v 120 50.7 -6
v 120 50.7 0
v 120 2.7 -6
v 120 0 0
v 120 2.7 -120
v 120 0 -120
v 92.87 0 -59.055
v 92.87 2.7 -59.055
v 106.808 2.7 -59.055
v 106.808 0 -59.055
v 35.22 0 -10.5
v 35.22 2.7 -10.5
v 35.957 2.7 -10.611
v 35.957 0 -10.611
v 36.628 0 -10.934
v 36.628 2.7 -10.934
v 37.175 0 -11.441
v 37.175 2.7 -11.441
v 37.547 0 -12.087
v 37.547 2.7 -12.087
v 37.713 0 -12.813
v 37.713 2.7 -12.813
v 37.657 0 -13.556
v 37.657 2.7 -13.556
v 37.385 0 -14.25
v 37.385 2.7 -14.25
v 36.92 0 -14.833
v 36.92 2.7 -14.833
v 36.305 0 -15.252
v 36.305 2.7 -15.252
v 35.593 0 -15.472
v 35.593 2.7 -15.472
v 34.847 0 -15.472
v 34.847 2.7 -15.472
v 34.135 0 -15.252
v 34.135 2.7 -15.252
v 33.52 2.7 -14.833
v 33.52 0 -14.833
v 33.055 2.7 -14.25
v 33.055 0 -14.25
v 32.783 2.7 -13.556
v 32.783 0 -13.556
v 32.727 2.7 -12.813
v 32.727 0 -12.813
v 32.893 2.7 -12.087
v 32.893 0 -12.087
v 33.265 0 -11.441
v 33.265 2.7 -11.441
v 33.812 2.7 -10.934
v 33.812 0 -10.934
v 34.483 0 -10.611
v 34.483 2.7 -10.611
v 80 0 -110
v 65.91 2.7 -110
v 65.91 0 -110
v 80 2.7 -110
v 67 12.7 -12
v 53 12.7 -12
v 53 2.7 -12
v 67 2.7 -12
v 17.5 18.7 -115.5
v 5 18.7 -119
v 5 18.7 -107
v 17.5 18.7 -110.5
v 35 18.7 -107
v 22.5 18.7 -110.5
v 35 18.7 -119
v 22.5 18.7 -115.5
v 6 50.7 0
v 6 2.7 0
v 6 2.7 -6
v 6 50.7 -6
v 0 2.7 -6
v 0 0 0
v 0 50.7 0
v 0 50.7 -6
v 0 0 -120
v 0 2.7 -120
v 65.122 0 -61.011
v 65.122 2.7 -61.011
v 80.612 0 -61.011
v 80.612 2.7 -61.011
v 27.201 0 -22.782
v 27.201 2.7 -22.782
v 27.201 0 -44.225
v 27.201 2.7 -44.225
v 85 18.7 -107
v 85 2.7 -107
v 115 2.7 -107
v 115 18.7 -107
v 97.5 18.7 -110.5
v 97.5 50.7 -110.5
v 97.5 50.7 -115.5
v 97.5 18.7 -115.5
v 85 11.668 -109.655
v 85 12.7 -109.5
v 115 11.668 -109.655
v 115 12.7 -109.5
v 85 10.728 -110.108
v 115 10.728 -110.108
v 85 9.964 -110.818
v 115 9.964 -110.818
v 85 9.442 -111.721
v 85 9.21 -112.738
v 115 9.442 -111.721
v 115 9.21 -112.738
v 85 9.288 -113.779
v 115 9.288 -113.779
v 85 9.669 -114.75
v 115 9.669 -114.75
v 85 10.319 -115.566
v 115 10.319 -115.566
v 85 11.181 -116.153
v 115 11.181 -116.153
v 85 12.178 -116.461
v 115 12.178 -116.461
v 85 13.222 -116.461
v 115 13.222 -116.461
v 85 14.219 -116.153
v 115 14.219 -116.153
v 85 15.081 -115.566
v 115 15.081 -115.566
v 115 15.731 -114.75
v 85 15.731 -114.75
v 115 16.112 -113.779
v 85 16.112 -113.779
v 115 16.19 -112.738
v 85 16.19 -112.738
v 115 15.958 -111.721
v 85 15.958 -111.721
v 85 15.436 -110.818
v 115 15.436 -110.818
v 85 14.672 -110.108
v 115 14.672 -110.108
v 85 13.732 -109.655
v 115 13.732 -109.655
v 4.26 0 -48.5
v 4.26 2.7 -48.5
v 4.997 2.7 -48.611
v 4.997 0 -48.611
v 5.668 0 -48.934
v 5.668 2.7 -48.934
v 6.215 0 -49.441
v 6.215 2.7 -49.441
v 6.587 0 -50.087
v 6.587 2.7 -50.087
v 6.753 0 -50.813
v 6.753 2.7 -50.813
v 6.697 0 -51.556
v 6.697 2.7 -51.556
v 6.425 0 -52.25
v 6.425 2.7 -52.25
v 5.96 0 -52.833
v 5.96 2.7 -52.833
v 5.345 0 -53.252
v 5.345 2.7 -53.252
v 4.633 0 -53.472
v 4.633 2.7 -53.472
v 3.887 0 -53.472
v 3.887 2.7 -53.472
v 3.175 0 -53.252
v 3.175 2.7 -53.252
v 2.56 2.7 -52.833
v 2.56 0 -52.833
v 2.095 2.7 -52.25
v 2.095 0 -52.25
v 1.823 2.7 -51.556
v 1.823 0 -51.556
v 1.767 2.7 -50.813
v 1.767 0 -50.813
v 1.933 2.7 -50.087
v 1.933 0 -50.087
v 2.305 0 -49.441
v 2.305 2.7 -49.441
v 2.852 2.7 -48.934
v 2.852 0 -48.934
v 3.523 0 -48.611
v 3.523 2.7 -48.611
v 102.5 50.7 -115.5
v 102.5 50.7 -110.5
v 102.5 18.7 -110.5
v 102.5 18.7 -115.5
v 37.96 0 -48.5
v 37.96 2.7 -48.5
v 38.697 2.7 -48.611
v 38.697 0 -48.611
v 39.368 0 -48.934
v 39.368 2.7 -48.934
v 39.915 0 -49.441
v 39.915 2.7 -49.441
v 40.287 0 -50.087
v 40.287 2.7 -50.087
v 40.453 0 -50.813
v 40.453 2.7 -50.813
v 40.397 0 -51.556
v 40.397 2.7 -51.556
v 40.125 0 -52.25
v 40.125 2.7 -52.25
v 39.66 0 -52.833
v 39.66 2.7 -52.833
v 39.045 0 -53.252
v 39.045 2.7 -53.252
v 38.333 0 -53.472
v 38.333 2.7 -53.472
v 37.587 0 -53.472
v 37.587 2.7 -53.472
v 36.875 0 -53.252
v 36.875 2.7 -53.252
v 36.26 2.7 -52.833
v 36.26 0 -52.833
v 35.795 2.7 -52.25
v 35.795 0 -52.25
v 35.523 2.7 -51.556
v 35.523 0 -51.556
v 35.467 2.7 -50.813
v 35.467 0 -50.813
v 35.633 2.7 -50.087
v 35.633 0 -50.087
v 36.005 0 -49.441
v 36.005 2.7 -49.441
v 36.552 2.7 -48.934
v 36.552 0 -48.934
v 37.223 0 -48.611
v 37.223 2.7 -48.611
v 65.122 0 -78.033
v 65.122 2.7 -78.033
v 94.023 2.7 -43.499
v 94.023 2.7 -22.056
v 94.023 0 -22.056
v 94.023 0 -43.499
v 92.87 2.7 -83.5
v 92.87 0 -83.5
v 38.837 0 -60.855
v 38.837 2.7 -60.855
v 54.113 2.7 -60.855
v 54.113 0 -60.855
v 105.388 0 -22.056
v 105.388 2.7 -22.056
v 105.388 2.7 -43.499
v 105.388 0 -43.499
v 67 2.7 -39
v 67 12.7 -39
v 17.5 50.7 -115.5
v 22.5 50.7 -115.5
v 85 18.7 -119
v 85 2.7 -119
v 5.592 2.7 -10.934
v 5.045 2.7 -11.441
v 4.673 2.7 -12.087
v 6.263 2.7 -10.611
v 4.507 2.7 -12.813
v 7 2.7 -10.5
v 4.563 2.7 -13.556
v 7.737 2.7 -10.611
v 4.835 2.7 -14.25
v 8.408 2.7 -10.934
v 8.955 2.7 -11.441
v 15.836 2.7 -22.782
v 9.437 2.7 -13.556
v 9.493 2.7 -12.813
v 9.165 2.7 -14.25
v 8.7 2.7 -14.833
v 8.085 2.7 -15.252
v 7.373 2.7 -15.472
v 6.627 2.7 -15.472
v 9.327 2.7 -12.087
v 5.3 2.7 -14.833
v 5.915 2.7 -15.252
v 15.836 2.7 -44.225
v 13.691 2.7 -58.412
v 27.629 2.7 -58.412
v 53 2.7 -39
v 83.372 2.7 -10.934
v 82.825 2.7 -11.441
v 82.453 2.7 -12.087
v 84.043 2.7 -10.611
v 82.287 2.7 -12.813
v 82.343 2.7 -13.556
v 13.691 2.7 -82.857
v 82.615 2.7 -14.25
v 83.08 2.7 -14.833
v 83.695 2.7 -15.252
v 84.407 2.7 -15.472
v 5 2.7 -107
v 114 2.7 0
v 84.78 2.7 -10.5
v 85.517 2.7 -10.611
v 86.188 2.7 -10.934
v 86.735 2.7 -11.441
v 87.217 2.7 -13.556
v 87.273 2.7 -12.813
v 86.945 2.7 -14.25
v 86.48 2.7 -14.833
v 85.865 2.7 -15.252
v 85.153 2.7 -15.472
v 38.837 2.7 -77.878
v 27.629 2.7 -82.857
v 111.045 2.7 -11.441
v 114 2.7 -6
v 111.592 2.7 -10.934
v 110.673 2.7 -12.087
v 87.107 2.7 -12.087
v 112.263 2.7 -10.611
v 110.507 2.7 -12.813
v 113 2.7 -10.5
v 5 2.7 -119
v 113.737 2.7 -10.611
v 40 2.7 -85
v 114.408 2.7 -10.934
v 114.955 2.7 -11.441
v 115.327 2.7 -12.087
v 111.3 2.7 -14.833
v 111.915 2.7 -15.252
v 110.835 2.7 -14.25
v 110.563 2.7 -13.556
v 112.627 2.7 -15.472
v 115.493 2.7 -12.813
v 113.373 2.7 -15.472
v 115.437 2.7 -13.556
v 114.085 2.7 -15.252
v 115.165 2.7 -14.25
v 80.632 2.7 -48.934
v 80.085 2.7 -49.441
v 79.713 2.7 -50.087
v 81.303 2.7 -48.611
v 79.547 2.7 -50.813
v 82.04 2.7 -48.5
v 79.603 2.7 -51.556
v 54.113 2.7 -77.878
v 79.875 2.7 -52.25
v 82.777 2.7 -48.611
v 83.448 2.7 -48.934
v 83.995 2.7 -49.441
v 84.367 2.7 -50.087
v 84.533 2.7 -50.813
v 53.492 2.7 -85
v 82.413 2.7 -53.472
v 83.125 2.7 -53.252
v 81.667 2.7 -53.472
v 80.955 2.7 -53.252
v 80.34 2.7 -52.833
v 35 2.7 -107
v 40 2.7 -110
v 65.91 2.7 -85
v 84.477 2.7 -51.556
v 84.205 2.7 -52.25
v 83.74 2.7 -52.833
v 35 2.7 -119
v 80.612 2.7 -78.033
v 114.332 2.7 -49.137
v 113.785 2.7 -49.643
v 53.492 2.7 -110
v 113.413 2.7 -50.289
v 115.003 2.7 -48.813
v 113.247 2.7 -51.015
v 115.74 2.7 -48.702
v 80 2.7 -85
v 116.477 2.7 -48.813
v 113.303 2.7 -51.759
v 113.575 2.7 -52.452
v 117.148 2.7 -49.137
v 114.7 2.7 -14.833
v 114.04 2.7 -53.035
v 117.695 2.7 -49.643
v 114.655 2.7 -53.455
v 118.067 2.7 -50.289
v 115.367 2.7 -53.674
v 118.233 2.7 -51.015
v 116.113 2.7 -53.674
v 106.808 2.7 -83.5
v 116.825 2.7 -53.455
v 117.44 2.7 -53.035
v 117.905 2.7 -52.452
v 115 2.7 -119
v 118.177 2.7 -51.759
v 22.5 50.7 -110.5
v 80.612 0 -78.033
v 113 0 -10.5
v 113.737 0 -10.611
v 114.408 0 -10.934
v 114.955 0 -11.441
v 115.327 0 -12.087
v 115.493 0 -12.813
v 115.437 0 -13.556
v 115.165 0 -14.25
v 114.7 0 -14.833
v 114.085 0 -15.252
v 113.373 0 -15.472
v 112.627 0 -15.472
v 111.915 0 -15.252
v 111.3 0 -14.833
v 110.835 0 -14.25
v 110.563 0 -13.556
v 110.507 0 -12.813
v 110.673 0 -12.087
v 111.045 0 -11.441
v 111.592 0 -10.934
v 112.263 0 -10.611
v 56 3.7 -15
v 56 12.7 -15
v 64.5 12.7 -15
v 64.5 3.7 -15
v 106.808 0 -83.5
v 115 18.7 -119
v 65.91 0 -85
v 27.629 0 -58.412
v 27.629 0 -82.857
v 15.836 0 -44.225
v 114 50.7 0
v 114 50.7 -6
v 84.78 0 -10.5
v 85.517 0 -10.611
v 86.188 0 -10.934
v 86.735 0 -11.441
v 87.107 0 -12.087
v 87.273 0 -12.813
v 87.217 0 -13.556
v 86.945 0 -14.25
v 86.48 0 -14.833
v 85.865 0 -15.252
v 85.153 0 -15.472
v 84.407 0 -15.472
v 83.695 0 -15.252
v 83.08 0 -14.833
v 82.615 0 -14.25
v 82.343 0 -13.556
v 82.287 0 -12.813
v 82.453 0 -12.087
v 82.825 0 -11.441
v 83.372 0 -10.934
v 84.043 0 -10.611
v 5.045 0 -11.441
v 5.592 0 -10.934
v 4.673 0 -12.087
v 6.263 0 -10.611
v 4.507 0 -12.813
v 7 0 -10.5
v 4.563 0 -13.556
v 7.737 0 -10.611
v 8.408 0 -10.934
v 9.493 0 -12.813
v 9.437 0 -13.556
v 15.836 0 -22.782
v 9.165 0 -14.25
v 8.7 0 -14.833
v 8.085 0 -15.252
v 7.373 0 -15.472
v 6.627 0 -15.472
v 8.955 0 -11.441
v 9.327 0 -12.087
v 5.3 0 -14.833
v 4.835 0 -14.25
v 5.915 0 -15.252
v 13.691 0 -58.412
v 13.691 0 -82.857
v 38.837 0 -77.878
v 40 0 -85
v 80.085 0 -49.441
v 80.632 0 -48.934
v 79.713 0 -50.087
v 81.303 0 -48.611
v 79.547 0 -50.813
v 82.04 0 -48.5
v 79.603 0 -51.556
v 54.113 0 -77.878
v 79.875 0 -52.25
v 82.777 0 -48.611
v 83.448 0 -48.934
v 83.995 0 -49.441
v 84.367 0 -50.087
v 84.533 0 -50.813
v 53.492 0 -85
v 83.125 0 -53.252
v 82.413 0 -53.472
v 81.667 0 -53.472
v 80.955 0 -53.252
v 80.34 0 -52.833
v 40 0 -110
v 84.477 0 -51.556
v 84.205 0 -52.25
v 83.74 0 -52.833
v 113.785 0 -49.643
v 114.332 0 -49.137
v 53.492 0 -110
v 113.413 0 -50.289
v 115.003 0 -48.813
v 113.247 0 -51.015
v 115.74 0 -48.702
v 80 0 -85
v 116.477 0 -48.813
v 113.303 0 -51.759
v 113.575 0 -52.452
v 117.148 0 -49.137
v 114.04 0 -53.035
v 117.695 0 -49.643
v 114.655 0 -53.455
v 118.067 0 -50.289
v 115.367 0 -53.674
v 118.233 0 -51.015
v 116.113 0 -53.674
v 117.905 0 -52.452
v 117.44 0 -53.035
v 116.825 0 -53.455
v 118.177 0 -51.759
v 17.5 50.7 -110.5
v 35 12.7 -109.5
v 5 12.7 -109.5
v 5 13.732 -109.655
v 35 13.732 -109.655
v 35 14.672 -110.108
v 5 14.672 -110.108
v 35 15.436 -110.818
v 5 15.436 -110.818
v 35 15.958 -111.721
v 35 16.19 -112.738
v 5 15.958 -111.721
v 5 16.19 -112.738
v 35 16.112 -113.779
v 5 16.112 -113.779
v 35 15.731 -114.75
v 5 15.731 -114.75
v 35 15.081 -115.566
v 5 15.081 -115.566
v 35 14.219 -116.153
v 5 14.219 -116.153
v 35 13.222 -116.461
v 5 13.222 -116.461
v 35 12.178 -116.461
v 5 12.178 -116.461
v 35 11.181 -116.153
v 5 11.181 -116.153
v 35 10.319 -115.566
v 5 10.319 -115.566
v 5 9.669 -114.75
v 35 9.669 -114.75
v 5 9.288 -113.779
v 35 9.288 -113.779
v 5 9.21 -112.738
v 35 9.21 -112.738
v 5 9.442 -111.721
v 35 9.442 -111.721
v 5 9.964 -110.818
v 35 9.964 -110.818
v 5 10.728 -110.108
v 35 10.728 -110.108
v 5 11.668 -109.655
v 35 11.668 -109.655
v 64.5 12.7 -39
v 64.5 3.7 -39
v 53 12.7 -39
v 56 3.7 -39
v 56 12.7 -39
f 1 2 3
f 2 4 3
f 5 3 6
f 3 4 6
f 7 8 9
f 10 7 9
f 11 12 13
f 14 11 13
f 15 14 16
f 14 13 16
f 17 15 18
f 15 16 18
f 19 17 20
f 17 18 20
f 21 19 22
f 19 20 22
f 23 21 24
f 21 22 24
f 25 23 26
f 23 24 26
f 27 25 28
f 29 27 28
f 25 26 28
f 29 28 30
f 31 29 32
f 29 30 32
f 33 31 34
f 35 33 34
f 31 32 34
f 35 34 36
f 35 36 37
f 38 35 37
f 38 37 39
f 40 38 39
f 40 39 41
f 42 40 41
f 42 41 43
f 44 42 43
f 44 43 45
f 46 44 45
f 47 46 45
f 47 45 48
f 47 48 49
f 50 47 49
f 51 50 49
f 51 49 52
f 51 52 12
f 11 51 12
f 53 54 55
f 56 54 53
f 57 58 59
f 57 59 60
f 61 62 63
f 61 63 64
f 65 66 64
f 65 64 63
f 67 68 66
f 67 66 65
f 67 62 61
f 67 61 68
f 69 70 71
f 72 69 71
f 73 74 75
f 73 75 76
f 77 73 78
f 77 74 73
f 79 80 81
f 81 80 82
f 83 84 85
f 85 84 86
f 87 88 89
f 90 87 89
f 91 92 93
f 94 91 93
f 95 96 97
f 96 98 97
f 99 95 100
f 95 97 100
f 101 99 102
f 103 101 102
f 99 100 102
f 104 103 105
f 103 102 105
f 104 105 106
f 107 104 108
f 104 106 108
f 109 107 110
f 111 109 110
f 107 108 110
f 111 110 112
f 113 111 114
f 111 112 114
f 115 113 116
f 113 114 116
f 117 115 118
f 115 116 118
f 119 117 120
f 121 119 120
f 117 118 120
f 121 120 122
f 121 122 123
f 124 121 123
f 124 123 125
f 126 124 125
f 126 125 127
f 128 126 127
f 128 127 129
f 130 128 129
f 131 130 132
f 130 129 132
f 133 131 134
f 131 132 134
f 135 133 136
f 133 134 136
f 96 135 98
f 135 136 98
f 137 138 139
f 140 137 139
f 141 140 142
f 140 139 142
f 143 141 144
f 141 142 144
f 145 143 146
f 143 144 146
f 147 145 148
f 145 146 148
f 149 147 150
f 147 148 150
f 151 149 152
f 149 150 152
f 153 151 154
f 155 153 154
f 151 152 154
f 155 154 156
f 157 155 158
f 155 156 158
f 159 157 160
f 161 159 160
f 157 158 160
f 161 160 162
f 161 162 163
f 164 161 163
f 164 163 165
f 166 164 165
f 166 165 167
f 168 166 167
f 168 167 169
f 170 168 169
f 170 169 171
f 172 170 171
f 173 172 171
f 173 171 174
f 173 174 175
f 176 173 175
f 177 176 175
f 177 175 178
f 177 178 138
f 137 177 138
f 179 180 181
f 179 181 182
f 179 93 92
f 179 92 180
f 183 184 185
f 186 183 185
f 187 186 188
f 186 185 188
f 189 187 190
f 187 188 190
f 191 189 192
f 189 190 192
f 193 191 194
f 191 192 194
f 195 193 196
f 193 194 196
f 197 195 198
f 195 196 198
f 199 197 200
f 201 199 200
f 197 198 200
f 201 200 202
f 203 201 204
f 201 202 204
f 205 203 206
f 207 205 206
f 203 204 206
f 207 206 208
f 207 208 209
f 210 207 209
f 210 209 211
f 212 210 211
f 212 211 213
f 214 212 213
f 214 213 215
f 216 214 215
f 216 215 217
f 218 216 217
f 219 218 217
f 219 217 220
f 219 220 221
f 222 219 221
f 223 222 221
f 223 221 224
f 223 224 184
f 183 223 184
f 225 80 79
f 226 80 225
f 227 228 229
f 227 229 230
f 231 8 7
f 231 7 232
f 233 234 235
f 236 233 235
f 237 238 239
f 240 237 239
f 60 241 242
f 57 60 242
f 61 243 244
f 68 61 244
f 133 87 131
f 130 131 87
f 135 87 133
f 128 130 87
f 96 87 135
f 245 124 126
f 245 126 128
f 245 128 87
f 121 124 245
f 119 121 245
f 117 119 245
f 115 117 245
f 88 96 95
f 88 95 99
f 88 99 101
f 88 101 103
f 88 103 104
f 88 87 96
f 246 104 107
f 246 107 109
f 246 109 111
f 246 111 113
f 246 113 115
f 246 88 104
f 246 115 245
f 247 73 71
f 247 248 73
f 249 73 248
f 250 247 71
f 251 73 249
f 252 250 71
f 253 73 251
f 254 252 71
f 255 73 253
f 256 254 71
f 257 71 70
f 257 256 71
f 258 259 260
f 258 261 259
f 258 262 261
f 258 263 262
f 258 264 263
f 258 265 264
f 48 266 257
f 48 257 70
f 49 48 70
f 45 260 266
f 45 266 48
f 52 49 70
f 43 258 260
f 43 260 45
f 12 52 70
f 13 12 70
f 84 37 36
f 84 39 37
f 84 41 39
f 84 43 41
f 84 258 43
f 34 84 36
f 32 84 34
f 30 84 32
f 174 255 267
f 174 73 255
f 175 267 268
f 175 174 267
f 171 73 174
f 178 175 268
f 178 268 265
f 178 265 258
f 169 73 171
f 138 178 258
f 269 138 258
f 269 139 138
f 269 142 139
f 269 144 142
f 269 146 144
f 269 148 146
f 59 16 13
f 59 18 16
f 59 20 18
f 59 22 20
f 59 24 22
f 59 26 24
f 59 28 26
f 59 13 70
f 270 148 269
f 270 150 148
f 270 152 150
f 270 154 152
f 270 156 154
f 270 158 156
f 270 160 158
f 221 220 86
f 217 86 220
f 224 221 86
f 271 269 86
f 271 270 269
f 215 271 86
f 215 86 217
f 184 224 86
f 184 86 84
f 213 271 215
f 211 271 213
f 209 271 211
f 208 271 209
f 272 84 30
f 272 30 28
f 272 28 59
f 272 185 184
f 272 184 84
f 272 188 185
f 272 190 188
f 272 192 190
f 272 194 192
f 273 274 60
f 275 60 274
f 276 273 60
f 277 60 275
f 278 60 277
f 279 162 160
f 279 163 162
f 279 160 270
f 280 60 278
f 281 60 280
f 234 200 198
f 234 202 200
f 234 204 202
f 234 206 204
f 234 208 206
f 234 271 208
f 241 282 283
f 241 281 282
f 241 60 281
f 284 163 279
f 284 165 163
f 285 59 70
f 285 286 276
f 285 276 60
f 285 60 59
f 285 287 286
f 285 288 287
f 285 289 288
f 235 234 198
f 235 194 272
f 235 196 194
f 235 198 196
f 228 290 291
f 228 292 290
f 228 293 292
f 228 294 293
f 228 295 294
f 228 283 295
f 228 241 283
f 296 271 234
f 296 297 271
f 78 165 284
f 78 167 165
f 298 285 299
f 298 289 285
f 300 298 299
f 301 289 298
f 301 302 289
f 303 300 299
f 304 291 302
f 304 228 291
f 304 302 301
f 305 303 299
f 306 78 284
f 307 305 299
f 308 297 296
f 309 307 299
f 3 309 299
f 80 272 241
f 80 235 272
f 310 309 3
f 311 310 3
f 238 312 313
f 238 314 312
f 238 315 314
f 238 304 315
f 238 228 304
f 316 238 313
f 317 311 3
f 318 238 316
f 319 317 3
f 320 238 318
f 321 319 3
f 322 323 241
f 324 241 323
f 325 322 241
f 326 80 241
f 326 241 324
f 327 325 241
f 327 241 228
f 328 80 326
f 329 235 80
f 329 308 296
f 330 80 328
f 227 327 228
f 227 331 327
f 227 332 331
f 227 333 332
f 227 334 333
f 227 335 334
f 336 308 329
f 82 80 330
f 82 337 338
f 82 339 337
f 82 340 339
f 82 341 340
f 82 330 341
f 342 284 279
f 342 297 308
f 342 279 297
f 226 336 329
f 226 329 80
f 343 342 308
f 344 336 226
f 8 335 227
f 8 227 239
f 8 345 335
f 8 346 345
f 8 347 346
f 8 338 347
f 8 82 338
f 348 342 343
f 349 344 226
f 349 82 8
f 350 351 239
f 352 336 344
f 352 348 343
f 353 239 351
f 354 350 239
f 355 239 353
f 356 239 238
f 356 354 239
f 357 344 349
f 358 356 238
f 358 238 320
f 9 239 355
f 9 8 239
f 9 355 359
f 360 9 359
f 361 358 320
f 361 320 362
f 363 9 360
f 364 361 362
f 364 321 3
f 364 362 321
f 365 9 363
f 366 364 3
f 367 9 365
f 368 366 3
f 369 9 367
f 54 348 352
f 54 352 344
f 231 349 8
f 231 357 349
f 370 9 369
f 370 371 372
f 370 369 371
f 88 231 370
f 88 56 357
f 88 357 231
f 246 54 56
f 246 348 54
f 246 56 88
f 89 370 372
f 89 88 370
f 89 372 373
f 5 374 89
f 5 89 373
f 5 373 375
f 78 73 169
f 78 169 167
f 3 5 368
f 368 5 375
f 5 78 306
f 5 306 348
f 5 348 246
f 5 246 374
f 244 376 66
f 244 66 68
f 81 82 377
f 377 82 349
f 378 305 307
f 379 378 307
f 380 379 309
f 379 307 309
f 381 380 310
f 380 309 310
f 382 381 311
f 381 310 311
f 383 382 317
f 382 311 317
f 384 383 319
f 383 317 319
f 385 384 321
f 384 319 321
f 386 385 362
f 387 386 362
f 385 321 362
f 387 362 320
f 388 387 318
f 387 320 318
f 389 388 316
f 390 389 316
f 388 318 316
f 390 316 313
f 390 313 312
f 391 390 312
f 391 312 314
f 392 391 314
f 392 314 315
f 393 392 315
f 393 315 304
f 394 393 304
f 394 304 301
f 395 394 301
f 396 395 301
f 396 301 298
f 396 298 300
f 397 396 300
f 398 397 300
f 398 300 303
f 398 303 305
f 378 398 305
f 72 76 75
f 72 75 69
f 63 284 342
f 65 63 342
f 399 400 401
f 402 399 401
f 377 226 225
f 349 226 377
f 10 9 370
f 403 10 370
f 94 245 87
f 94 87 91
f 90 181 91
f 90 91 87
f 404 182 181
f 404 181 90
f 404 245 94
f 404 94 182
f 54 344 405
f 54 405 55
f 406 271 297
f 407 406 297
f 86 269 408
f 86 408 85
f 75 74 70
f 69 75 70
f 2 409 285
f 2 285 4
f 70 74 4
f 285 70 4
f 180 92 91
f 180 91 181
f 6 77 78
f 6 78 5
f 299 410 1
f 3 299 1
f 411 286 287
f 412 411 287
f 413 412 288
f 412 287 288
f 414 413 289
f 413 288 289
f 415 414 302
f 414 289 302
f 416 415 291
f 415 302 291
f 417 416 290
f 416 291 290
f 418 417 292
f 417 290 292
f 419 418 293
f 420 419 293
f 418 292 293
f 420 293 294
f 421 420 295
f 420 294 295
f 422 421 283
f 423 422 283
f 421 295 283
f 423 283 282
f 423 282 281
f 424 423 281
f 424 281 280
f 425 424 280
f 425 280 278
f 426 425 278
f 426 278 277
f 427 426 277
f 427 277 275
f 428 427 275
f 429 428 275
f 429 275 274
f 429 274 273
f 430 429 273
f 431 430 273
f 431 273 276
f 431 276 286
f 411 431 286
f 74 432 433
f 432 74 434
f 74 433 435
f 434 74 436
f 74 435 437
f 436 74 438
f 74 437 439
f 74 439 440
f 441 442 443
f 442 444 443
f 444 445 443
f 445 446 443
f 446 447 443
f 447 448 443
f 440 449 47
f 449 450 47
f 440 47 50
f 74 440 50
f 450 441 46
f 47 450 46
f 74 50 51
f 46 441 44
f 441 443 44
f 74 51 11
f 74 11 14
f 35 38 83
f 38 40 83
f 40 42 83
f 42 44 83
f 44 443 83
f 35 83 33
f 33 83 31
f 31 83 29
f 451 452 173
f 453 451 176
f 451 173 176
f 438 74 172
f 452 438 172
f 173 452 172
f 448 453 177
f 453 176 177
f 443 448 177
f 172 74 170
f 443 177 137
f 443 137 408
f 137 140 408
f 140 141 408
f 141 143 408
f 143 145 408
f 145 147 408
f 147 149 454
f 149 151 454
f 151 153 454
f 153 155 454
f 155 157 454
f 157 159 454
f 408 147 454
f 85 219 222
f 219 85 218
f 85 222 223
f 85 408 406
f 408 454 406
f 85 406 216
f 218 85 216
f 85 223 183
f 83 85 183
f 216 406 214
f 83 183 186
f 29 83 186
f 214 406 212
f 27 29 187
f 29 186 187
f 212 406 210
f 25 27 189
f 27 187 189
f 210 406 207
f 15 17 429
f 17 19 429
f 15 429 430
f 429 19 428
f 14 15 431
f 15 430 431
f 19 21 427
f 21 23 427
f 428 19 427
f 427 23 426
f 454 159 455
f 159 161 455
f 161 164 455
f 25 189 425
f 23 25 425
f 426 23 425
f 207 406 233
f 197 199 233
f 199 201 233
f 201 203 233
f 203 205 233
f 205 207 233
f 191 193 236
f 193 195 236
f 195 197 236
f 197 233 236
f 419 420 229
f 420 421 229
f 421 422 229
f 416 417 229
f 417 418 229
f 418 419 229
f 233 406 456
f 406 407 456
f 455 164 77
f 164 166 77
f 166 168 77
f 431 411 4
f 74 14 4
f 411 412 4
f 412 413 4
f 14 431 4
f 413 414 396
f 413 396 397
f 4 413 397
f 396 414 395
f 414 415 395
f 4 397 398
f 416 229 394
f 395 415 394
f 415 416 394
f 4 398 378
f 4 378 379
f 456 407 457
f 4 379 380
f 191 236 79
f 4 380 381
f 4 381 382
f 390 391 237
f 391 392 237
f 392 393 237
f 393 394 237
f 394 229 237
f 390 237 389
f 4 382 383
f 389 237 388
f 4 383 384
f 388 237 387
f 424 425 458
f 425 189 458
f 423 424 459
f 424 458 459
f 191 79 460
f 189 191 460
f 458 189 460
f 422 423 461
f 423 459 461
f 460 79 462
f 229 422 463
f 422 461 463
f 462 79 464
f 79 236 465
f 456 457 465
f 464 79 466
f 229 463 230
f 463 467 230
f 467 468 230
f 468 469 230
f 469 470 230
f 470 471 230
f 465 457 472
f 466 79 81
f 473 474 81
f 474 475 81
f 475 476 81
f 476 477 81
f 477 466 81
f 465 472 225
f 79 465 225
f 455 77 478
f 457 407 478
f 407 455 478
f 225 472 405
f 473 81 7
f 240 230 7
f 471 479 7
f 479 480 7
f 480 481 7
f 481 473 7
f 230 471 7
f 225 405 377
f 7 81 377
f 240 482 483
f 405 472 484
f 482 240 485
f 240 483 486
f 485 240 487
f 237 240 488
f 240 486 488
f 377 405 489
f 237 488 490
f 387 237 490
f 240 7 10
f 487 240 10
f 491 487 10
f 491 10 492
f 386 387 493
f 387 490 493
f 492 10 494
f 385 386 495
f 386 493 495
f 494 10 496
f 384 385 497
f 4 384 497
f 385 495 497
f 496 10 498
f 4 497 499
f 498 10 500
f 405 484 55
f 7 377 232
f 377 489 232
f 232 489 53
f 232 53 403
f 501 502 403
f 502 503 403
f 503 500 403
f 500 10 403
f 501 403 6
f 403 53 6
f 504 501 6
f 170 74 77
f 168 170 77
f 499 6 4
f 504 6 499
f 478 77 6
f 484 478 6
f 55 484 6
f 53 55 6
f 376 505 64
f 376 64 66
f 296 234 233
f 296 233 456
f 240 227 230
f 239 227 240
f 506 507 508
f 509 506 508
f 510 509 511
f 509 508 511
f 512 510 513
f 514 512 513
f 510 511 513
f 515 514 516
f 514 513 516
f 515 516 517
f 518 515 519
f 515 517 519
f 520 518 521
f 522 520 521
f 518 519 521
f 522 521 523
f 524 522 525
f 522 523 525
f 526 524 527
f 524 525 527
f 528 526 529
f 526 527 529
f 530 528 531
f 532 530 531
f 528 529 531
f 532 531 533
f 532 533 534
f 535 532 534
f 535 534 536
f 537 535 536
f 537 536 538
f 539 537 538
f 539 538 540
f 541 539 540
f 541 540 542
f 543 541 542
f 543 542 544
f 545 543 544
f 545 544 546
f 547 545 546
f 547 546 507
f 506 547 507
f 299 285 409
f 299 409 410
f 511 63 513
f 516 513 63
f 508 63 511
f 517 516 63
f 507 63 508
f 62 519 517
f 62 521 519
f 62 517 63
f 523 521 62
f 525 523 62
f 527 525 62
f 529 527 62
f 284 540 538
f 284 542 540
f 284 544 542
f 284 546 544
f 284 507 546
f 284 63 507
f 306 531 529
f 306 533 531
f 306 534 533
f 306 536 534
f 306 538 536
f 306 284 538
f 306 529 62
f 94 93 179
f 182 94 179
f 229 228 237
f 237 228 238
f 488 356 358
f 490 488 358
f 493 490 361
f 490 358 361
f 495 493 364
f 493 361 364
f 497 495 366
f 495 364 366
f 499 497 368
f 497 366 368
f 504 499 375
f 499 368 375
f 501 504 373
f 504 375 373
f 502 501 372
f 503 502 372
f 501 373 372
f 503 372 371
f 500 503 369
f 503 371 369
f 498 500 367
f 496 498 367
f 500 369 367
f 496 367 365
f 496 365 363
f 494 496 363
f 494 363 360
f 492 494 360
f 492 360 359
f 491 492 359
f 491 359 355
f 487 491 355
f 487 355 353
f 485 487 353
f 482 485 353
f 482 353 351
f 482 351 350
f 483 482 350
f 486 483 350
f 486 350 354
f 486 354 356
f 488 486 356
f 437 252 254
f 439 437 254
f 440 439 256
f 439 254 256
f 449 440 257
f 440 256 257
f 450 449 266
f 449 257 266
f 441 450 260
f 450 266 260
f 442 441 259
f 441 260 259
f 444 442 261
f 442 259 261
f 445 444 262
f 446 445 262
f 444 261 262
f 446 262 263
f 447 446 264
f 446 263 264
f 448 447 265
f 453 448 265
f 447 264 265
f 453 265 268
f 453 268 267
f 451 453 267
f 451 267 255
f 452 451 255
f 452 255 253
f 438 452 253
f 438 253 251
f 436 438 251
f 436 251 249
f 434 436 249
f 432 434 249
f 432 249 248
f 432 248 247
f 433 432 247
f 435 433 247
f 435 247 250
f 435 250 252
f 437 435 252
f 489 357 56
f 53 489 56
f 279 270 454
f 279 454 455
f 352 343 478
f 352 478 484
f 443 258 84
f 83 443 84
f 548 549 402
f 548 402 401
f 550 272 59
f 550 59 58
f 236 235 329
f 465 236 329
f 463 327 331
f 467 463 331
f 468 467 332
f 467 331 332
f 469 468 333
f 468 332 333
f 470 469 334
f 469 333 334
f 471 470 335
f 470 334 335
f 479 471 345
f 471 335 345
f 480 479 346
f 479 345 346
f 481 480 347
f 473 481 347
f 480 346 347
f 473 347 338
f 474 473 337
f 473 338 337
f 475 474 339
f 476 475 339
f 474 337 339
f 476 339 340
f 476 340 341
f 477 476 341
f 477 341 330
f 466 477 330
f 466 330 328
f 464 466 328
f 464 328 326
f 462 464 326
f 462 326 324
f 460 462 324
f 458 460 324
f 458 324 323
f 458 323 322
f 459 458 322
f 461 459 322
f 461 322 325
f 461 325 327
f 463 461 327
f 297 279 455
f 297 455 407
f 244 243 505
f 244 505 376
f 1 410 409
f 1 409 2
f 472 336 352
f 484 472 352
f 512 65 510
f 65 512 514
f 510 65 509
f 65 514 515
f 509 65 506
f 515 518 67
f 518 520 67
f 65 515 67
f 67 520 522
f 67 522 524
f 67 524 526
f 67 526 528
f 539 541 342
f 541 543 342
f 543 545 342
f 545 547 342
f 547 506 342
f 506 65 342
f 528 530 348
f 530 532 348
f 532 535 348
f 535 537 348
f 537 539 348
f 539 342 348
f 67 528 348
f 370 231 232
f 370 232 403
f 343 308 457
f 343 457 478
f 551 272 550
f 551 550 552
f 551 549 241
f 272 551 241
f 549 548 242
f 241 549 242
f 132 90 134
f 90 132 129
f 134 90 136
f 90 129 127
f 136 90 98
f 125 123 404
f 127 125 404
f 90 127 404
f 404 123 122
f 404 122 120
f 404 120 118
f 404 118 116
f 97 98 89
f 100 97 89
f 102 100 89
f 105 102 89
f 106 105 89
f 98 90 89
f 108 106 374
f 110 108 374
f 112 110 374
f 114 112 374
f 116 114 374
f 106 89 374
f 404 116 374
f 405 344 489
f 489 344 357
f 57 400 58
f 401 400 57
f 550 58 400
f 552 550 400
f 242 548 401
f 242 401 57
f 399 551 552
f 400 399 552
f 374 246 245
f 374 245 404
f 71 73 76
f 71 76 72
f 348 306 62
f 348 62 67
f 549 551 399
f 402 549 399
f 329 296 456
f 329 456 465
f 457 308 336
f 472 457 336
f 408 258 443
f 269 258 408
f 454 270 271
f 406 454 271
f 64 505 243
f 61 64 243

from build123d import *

# Parameters (mm, degrees)
SKETCH1_W                 = 120
SKETCH1_H                 = 120
BOSS_EXTRUDE1_DEPTH       = 2.7
CUT_EXTRUDE1_REACH        = 171.727
SKETCH2_W                 = 13.492346384
SKETCH2_H                 = 25
SKETCH2_W_2               = 14.089535058
SKETCH2_3_W               = 30
SKETCH2_3_H               = 12
BOSS_EXTRUDE2_DEPTH       = 16
CUT_EXTRUDE2_REACH        = 169.256
SKETCH4_R                 = 3.5
CUT_EXTRUDE3_REACH        = 169.256
SKETCH5_R                 = 3.5
CUT_EXTRUDE4_REACH        = 172.458
SKETCH6_R                 = 2.5
BOSS_EXTRUDE4_START       = 56
BOSS_EXTRUDE4_OUTLINE_W   = 1
BOSS_EXTRUDE4_OUTLINE_H   = 24
BOSS_EXTRUDE4_DEPTH       = 8.5
BOSS_EXTRUDE5_START       = -39
BOSS_EXTRUDE5_OUTLINE_W   = 2.5
BOSS_EXTRUDE5_OUTLINE_H   = 10
BOSS_EXTRUDE5_OUTLINE_W_2 = 3
BOSS_EXTRUDE5_DEPTH       = 27
BOSS_EXTRUDE5_START_2     = -15
BOSS_EXTRUDE5_2_OUTLINE_W = 8.5
BOSS_EXTRUDE5_2_OUTLINE_H = 10
BOSS_EXTRUDE5_2_DEPTH     = 3
CUT_EXTRUDE5_REACH        = 172.458
SKETCH8_W                 = 13.93792073
SKETCH8_H                 = 24.444968664
SKETCH8_W_2               = 11.364766133
SKETCH8_H_2               = 21.442954969
SKETCH8_W_3               = 15.276468839
SKETCH8_H_3               = 17.022275105
SKETCH8_H_4               = 21.442954968
SKETCH8_W_4               = 15.490753693
SKETCH9_W                 = 5
SKETCH9_H                 = 5
BOSS_EXTRUDE6_DEPTH       = 32
SKETCH10_W                = 6
SKETCH10_H                = 6
BOSS_EXTRUDE7_DEPTH       = 48


# Read off the part's stored shape, not the designer's step: Boss-Extrude4, Boss-Extrude5
with BuildPart() as part:
    # Sketch1 → Boss-Extrude1 (new body)
    with BuildSketch(Plane(origin=(0, 0, 0), x_dir=(1, 0, 0), z_dir=(0, 1, 0))):
        with Locations((60, 60)):
            Rectangle(SKETCH1_W, SKETCH1_H)
    extrude(amount=BOSS_EXTRUDE1_DEPTH)

    # Sketch2 → Cut-Extrude1 (cut, up to next)
    with BuildSketch(Plane(origin=(0, 2.7, 0), x_dir=(1, 0, 0), z_dir=(0, 1, 0)), mode=Mode.PRIVATE) as cut_extrude1_sk1:
        with Locations((46.746173192, 97.5)):
            Rectangle(SKETCH2_W, SKETCH2_H)
    cut_extrude1_tool1 = extrude(cut_extrude1_sk1.sketch, amount=-CUT_EXTRUDE1_REACH, mode=Mode.PRIVATE) & part.part
    # Sketch2 → Cut-Extrude1 (cut, up to next)
    with BuildSketch(Plane(origin=(0, 2.7, 0), x_dir=(1, 0, 0), z_dir=(0, 1, 0)), mode=Mode.PRIVATE) as cut_extrude1_sk2:
        with Locations((72.955232471, 97.5)):
            Rectangle(SKETCH2_W_2, SKETCH2_H)
    cut_extrude1_tool2 = extrude(cut_extrude1_sk2.sketch, amount=-CUT_EXTRUDE1_REACH, mode=Mode.PRIVATE) & part.part
    add(cut_extrude1_tool1.solids().sort_by_distance((46.746173, 2.7, -97.5))[0], mode=Mode.SUBTRACT)
    add(cut_extrude1_tool2.solids().sort_by_distance((72.955232, 2.7, -97.5))[0], mode=Mode.SUBTRACT)

    # Sketch2<3> → Boss-Extrude2 (add)
    with BuildSketch(Plane(origin=(0, 2.7, 0), x_dir=(1, 0, 0), z_dir=(0, 1, 0))):
        with Locations((20, 113)):
            Rectangle(SKETCH2_3_W, SKETCH2_3_H)
        with Locations((100, 113)):
            Rectangle(SKETCH2_3_W, SKETCH2_3_H)
    extrude(amount=BOSS_EXTRUDE2_DEPTH)

    # Sketch4 → Cut-Extrude2 (cut, up to next)
    with BuildSketch(Plane.ZY.offset(-5), mode=Mode.PRIVATE) as cut_extrude2_sk1:
        with Locations((-113, 12.7)):
            Circle(SKETCH4_R)
    cut_extrude2_tool1 = extrude(cut_extrude2_sk1.sketch, amount=-CUT_EXTRUDE2_REACH, mode=Mode.PRIVATE) & part.part
    add(cut_extrude2_tool1.solids().sort_by_distance((5, 12.7, -113))[0], mode=Mode.SUBTRACT)

    # Sketch5 → Cut-Extrude3 (cut, up to next)
    with BuildSketch(Plane(origin=(115, 0, 0), x_dir=(0, 0, -1), z_dir=(1, 0, 0)), mode=Mode.PRIVATE) as cut_extrude3_sk1:
        with Locations(Location((113, 12.7, 0), (0, 0, 180))):
            Circle(SKETCH5_R)
    cut_extrude3_tool1 = extrude(cut_extrude3_sk1.sketch, amount=-CUT_EXTRUDE3_REACH, mode=Mode.PRIVATE) & part.part
    add(cut_extrude3_tool1.solids().sort_by_distance((115, 12.7, -113))[0], mode=Mode.SUBTRACT)

    # Sketch6 → Cut-Extrude4 (cut, up to next)
    with BuildSketch(Plane(origin=(0, 2.7, 0), x_dir=(1, 0, 0), z_dir=(0, 1, 0)), mode=Mode.PRIVATE) as cut_extrude4_sk1:
        with Locations(Location((7, 13, 0), (0, 0, 270))):
            Circle(SKETCH6_R)
    cut_extrude4_tool1 = extrude(cut_extrude4_sk1.sketch, amount=-CUT_EXTRUDE4_REACH, mode=Mode.PRIVATE) & part.part
    # Sketch6 → Cut-Extrude4 (cut, up to next)
    with BuildSketch(Plane(origin=(0, 2.7, 0), x_dir=(1, 0, 0), z_dir=(0, 1, 0)), mode=Mode.PRIVATE) as cut_extrude4_sk2:
        with Locations(Location((4.26, 51, 0), (0, 0, 270))):
            Circle(SKETCH6_R)
    cut_extrude4_tool2 = extrude(cut_extrude4_sk2.sketch, amount=-CUT_EXTRUDE4_REACH, mode=Mode.PRIVATE) & part.part
    # Sketch6 → Cut-Extrude4 (cut, up to next)
    with BuildSketch(Plane(origin=(0, 2.7, 0), x_dir=(1, 0, 0), z_dir=(0, 1, 0)), mode=Mode.PRIVATE) as cut_extrude4_sk3:
        with Locations(Location((37.96, 51, 0), (0, 0, 270))):
            Circle(SKETCH6_R)
    cut_extrude4_tool3 = extrude(cut_extrude4_sk3.sketch, amount=-CUT_EXTRUDE4_REACH, mode=Mode.PRIVATE) & part.part
    # Sketch6 → Cut-Extrude4 (cut, up to next)
    with BuildSketch(Plane(origin=(0, 2.7, 0), x_dir=(1, 0, 0), z_dir=(0, 1, 0)), mode=Mode.PRIVATE) as cut_extrude4_sk4:
        with Locations(Location((84.78, 13, 0), (0, 0, 270))):
            Circle(SKETCH6_R)
    cut_extrude4_tool4 = extrude(cut_extrude4_sk4.sketch, amount=-CUT_EXTRUDE4_REACH, mode=Mode.PRIVATE) & part.part
    # Sketch6 → Cut-Extrude4 (cut, up to next)
    with BuildSketch(Plane(origin=(0, 2.7, 0), x_dir=(1, 0, 0), z_dir=(0, 1, 0)), mode=Mode.PRIVATE) as cut_extrude4_sk5:
        with Locations(Location((82.04, 51, 0), (0, 0, 270))):
            Circle(SKETCH6_R)
    cut_extrude4_tool5 = extrude(cut_extrude4_sk5.sketch, amount=-CUT_EXTRUDE4_REACH, mode=Mode.PRIVATE) & part.part
    # Sketch6 → Cut-Extrude4 (cut, up to next)
    with BuildSketch(Plane(origin=(0, 2.7, 0), x_dir=(1, 0, 0), z_dir=(0, 1, 0)), mode=Mode.PRIVATE) as cut_extrude4_sk6:
        with Locations(Location((115.74, 51.20220141, 0), (0, 0, 270))):
            Circle(SKETCH6_R)
    cut_extrude4_tool6 = extrude(cut_extrude4_sk6.sketch, amount=-CUT_EXTRUDE4_REACH, mode=Mode.PRIVATE) & part.part
    # Sketch6 → Cut-Extrude4 (cut, up to next)
    with BuildSketch(Plane(origin=(0, 2.7, 0), x_dir=(1, 0, 0), z_dir=(0, 1, 0)), mode=Mode.PRIVATE) as cut_extrude4_sk7:
        with Locations(Location((113, 13, 0), (0, 0, 270))):
            Circle(SKETCH6_R)
    cut_extrude4_tool7 = extrude(cut_extrude4_sk7.sketch, amount=-CUT_EXTRUDE4_REACH, mode=Mode.PRIVATE) & part.part
    # Sketch6 → Cut-Extrude4 (cut, up to next)
    with BuildSketch(Plane(origin=(0, 2.7, 0), x_dir=(1, 0, 0), z_dir=(0, 1, 0)), mode=Mode.PRIVATE) as cut_extrude4_sk8:
        with Locations(Location((35.22, 13, 0), (0, 0, 270))):
            Circle(SKETCH6_R)
    cut_extrude4_tool8 = extrude(cut_extrude4_sk8.sketch, amount=-CUT_EXTRUDE4_REACH, mode=Mode.PRIVATE) & part.part
    add(cut_extrude4_tool1.solids().sort_by_distance((7, 2.7, -13))[0], mode=Mode.SUBTRACT)
    add(cut_extrude4_tool2.solids().sort_by_distance((4.26, 2.7, -51))[0], mode=Mode.SUBTRACT)
    add(cut_extrude4_tool3.solids().sort_by_distance((37.96, 2.7, -51))[0], mode=Mode.SUBTRACT)
    add(cut_extrude4_tool4.solids().sort_by_distance((84.78, 2.7, -13))[0], mode=Mode.SUBTRACT)
    add(cut_extrude4_tool5.solids().sort_by_distance((82.04, 2.7, -51))[0], mode=Mode.SUBTRACT)
    add(cut_extrude4_tool6.solids().sort_by_distance((115.74, 2.7, -51.202201))[0], mode=Mode.SUBTRACT)
    add(cut_extrude4_tool7.solids().sort_by_distance((113, 2.7, -13))[0], mode=Mode.SUBTRACT)
    add(cut_extrude4_tool8.solids().sort_by_distance((35.22, 2.7, -13))[0], mode=Mode.SUBTRACT)

    # Boss-Extrude4 outline → Boss-Extrude4 (add)
    with BuildSketch(Plane.YZ.offset(BOSS_EXTRUDE4_START)):
        with Locations((3.2, -27)):
            Rectangle(BOSS_EXTRUDE4_OUTLINE_W, BOSS_EXTRUDE4_OUTLINE_H)
    extrude(amount=BOSS_EXTRUDE4_DEPTH)

    # Boss-Extrude5 outline → Boss-Extrude5 (add)
    with BuildSketch(Plane.XY.offset(BOSS_EXTRUDE5_START)):
        with Locations((65.75, 7.7)):
            Rectangle(BOSS_EXTRUDE5_OUTLINE_W, BOSS_EXTRUDE5_OUTLINE_H)
        with Locations((54.5, 7.7)):
            Rectangle(BOSS_EXTRUDE5_OUTLINE_W_2, BOSS_EXTRUDE5_OUTLINE_H)
    extrude(amount=BOSS_EXTRUDE5_DEPTH)

    # Boss-Extrude5 2 outline → Boss-Extrude5 2 (add)
    with BuildSketch(Plane.XY.offset(BOSS_EXTRUDE5_START_2)):
        with Locations((60.25, 7.7)):
            Rectangle(BOSS_EXTRUDE5_2_OUTLINE_W, BOSS_EXTRUDE5_2_OUTLINE_H)
    extrude(amount=BOSS_EXTRUDE5_2_DEPTH)

    # Sketch8 → Cut-Extrude5 (cut, up to next)
    with BuildSketch(Plane(origin=(0, 2.7, 0), x_dir=(1, 0, 0), z_dir=(0, 1, 0)), mode=Mode.PRIVATE) as cut_extrude5_sk1:
        with Locations((99.838592928, 71.277482239)):
            Rectangle(SKETCH8_W, SKETCH8_H)
    cut_extrude5_tool1 = extrude(cut_extrude5_sk1.sketch, amount=-CUT_EXTRUDE5_REACH, mode=Mode.PRIVATE) & part.part
    # Sketch8 → Cut-Extrude5 (cut, up to next)
    with BuildSketch(Plane(origin=(0, 2.7, 0), x_dir=(1, 0, 0), z_dir=(0, 1, 0)), mode=Mode.PRIVATE) as cut_extrude5_sk2:
        with Locations((21.518433658, 33.503955022)):
            Rectangle(SKETCH8_W_2, SKETCH8_H_2)
    cut_extrude5_tool2 = extrude(cut_extrude5_sk2.sketch, amount=-CUT_EXTRUDE5_REACH, mode=Mode.PRIVATE) & part.part
    # Sketch8 → Cut-Extrude5 (cut, up to next)
    with BuildSketch(Plane(origin=(0, 2.7, 0), x_dir=(1, 0, 0), z_dir=(0, 1, 0)), mode=Mode.PRIVATE) as cut_extrude5_sk3:
        with Locations((20.660272656, 70.634411505)):
            Rectangle(SKETCH8_W, SKETCH8_H)
    cut_extrude5_tool3 = extrude(cut_extrude5_sk3.sketch, amount=-CUT_EXTRUDE5_REACH, mode=Mode.PRIVATE) & part.part
    # Sketch8 → Cut-Extrude5 (cut, up to next)
    with BuildSketch(Plane(origin=(0, 2.7, 0), x_dir=(1, 0, 0), z_dir=(0, 1, 0)), mode=Mode.PRIVATE) as cut_extrude5_sk4:
        with Locations((46.474954565, 69.366478605)):
            Rectangle(SKETCH8_W_3, SKETCH8_H_3)
    cut_extrude5_tool4 = extrude(cut_extrude5_sk4.sketch, amount=-CUT_EXTRUDE5_REACH, mode=Mode.PRIVATE) & part.part
    # Sketch8 → Cut-Extrude5 (cut, up to next)
    with BuildSketch(Plane(origin=(0, 2.7, 0), x_dir=(1, 0, 0), z_dir=(0, 1, 0)), mode=Mode.PRIVATE) as cut_extrude5_sk5:
        with Locations((99.705334599, 32.777682609)):
            Rectangle(SKETCH8_W_2, SKETCH8_H_4)
    cut_extrude5_tool5 = extrude(cut_extrude5_sk5.sketch, amount=-CUT_EXTRUDE5_REACH, mode=Mode.PRIVATE) & part.part
    # Sketch8 → Cut-Extrude5 (cut, up to next)
    with BuildSketch(Plane(origin=(0, 2.7, 0), x_dir=(1, 0, 0), z_dir=(0, 1, 0)), mode=Mode.PRIVATE) as cut_extrude5_sk6:
        with Locations((72.867080872, 69.52199516)):
            Rectangle(SKETCH8_W_4, SKETCH8_H_3)
    cut_extrude5_tool6 = extrude(cut_extrude5_sk6.sketch, amount=-CUT_EXTRUDE5_REACH, mode=Mode.PRIVATE) & part.part
    add(cut_extrude5_tool1.solids().sort_by_distance((99.838593, 2.7, -71.277482))[0], mode=Mode.SUBTRACT)
    add(cut_extrude5_tool2.solids().sort_by_distance((21.518434, 2.7, -33.503955))[0], mode=Mode.SUBTRACT)
    add(cut_extrude5_tool3.solids().sort_by_distance((20.660273, 2.7, -70.634412))[0], mode=Mode.SUBTRACT)
    add(cut_extrude5_tool4.solids().sort_by_distance((46.474955, 2.7, -69.366479))[0], mode=Mode.SUBTRACT)
    add(cut_extrude5_tool5.solids().sort_by_distance((99.705335, 2.7, -32.777683))[0], mode=Mode.SUBTRACT)
    add(cut_extrude5_tool6.solids().sort_by_distance((72.867081, 2.7, -69.521995))[0], mode=Mode.SUBTRACT)

    # Sketch9 → Boss-Extrude6 (add)
    with BuildSketch(Plane(origin=(0, 18.7, 0), x_dir=(1, 0, 0), z_dir=(0, 1, 0))):
        with Locations((20, 113)):
            Rectangle(SKETCH9_W, SKETCH9_H)
        with Locations((100, 113)):
            Rectangle(SKETCH9_W, SKETCH9_H)
    extrude(amount=BOSS_EXTRUDE6_DEPTH)

    # Sketch10 → Boss-Extrude7 (add)
    with BuildSketch(Plane(origin=(0, 2.7, 0), x_dir=(1, 0, 0), z_dir=(0, 1, 0))):
        with Locations((117, 3)):
            Rectangle(SKETCH10_W, SKETCH10_H)
        with Locations((3, 3)):
            Rectangle(SKETCH10_W, SKETCH10_H)
    extrude(amount=BOSS_EXTRUDE7_DEPTH)


solid = part.part
